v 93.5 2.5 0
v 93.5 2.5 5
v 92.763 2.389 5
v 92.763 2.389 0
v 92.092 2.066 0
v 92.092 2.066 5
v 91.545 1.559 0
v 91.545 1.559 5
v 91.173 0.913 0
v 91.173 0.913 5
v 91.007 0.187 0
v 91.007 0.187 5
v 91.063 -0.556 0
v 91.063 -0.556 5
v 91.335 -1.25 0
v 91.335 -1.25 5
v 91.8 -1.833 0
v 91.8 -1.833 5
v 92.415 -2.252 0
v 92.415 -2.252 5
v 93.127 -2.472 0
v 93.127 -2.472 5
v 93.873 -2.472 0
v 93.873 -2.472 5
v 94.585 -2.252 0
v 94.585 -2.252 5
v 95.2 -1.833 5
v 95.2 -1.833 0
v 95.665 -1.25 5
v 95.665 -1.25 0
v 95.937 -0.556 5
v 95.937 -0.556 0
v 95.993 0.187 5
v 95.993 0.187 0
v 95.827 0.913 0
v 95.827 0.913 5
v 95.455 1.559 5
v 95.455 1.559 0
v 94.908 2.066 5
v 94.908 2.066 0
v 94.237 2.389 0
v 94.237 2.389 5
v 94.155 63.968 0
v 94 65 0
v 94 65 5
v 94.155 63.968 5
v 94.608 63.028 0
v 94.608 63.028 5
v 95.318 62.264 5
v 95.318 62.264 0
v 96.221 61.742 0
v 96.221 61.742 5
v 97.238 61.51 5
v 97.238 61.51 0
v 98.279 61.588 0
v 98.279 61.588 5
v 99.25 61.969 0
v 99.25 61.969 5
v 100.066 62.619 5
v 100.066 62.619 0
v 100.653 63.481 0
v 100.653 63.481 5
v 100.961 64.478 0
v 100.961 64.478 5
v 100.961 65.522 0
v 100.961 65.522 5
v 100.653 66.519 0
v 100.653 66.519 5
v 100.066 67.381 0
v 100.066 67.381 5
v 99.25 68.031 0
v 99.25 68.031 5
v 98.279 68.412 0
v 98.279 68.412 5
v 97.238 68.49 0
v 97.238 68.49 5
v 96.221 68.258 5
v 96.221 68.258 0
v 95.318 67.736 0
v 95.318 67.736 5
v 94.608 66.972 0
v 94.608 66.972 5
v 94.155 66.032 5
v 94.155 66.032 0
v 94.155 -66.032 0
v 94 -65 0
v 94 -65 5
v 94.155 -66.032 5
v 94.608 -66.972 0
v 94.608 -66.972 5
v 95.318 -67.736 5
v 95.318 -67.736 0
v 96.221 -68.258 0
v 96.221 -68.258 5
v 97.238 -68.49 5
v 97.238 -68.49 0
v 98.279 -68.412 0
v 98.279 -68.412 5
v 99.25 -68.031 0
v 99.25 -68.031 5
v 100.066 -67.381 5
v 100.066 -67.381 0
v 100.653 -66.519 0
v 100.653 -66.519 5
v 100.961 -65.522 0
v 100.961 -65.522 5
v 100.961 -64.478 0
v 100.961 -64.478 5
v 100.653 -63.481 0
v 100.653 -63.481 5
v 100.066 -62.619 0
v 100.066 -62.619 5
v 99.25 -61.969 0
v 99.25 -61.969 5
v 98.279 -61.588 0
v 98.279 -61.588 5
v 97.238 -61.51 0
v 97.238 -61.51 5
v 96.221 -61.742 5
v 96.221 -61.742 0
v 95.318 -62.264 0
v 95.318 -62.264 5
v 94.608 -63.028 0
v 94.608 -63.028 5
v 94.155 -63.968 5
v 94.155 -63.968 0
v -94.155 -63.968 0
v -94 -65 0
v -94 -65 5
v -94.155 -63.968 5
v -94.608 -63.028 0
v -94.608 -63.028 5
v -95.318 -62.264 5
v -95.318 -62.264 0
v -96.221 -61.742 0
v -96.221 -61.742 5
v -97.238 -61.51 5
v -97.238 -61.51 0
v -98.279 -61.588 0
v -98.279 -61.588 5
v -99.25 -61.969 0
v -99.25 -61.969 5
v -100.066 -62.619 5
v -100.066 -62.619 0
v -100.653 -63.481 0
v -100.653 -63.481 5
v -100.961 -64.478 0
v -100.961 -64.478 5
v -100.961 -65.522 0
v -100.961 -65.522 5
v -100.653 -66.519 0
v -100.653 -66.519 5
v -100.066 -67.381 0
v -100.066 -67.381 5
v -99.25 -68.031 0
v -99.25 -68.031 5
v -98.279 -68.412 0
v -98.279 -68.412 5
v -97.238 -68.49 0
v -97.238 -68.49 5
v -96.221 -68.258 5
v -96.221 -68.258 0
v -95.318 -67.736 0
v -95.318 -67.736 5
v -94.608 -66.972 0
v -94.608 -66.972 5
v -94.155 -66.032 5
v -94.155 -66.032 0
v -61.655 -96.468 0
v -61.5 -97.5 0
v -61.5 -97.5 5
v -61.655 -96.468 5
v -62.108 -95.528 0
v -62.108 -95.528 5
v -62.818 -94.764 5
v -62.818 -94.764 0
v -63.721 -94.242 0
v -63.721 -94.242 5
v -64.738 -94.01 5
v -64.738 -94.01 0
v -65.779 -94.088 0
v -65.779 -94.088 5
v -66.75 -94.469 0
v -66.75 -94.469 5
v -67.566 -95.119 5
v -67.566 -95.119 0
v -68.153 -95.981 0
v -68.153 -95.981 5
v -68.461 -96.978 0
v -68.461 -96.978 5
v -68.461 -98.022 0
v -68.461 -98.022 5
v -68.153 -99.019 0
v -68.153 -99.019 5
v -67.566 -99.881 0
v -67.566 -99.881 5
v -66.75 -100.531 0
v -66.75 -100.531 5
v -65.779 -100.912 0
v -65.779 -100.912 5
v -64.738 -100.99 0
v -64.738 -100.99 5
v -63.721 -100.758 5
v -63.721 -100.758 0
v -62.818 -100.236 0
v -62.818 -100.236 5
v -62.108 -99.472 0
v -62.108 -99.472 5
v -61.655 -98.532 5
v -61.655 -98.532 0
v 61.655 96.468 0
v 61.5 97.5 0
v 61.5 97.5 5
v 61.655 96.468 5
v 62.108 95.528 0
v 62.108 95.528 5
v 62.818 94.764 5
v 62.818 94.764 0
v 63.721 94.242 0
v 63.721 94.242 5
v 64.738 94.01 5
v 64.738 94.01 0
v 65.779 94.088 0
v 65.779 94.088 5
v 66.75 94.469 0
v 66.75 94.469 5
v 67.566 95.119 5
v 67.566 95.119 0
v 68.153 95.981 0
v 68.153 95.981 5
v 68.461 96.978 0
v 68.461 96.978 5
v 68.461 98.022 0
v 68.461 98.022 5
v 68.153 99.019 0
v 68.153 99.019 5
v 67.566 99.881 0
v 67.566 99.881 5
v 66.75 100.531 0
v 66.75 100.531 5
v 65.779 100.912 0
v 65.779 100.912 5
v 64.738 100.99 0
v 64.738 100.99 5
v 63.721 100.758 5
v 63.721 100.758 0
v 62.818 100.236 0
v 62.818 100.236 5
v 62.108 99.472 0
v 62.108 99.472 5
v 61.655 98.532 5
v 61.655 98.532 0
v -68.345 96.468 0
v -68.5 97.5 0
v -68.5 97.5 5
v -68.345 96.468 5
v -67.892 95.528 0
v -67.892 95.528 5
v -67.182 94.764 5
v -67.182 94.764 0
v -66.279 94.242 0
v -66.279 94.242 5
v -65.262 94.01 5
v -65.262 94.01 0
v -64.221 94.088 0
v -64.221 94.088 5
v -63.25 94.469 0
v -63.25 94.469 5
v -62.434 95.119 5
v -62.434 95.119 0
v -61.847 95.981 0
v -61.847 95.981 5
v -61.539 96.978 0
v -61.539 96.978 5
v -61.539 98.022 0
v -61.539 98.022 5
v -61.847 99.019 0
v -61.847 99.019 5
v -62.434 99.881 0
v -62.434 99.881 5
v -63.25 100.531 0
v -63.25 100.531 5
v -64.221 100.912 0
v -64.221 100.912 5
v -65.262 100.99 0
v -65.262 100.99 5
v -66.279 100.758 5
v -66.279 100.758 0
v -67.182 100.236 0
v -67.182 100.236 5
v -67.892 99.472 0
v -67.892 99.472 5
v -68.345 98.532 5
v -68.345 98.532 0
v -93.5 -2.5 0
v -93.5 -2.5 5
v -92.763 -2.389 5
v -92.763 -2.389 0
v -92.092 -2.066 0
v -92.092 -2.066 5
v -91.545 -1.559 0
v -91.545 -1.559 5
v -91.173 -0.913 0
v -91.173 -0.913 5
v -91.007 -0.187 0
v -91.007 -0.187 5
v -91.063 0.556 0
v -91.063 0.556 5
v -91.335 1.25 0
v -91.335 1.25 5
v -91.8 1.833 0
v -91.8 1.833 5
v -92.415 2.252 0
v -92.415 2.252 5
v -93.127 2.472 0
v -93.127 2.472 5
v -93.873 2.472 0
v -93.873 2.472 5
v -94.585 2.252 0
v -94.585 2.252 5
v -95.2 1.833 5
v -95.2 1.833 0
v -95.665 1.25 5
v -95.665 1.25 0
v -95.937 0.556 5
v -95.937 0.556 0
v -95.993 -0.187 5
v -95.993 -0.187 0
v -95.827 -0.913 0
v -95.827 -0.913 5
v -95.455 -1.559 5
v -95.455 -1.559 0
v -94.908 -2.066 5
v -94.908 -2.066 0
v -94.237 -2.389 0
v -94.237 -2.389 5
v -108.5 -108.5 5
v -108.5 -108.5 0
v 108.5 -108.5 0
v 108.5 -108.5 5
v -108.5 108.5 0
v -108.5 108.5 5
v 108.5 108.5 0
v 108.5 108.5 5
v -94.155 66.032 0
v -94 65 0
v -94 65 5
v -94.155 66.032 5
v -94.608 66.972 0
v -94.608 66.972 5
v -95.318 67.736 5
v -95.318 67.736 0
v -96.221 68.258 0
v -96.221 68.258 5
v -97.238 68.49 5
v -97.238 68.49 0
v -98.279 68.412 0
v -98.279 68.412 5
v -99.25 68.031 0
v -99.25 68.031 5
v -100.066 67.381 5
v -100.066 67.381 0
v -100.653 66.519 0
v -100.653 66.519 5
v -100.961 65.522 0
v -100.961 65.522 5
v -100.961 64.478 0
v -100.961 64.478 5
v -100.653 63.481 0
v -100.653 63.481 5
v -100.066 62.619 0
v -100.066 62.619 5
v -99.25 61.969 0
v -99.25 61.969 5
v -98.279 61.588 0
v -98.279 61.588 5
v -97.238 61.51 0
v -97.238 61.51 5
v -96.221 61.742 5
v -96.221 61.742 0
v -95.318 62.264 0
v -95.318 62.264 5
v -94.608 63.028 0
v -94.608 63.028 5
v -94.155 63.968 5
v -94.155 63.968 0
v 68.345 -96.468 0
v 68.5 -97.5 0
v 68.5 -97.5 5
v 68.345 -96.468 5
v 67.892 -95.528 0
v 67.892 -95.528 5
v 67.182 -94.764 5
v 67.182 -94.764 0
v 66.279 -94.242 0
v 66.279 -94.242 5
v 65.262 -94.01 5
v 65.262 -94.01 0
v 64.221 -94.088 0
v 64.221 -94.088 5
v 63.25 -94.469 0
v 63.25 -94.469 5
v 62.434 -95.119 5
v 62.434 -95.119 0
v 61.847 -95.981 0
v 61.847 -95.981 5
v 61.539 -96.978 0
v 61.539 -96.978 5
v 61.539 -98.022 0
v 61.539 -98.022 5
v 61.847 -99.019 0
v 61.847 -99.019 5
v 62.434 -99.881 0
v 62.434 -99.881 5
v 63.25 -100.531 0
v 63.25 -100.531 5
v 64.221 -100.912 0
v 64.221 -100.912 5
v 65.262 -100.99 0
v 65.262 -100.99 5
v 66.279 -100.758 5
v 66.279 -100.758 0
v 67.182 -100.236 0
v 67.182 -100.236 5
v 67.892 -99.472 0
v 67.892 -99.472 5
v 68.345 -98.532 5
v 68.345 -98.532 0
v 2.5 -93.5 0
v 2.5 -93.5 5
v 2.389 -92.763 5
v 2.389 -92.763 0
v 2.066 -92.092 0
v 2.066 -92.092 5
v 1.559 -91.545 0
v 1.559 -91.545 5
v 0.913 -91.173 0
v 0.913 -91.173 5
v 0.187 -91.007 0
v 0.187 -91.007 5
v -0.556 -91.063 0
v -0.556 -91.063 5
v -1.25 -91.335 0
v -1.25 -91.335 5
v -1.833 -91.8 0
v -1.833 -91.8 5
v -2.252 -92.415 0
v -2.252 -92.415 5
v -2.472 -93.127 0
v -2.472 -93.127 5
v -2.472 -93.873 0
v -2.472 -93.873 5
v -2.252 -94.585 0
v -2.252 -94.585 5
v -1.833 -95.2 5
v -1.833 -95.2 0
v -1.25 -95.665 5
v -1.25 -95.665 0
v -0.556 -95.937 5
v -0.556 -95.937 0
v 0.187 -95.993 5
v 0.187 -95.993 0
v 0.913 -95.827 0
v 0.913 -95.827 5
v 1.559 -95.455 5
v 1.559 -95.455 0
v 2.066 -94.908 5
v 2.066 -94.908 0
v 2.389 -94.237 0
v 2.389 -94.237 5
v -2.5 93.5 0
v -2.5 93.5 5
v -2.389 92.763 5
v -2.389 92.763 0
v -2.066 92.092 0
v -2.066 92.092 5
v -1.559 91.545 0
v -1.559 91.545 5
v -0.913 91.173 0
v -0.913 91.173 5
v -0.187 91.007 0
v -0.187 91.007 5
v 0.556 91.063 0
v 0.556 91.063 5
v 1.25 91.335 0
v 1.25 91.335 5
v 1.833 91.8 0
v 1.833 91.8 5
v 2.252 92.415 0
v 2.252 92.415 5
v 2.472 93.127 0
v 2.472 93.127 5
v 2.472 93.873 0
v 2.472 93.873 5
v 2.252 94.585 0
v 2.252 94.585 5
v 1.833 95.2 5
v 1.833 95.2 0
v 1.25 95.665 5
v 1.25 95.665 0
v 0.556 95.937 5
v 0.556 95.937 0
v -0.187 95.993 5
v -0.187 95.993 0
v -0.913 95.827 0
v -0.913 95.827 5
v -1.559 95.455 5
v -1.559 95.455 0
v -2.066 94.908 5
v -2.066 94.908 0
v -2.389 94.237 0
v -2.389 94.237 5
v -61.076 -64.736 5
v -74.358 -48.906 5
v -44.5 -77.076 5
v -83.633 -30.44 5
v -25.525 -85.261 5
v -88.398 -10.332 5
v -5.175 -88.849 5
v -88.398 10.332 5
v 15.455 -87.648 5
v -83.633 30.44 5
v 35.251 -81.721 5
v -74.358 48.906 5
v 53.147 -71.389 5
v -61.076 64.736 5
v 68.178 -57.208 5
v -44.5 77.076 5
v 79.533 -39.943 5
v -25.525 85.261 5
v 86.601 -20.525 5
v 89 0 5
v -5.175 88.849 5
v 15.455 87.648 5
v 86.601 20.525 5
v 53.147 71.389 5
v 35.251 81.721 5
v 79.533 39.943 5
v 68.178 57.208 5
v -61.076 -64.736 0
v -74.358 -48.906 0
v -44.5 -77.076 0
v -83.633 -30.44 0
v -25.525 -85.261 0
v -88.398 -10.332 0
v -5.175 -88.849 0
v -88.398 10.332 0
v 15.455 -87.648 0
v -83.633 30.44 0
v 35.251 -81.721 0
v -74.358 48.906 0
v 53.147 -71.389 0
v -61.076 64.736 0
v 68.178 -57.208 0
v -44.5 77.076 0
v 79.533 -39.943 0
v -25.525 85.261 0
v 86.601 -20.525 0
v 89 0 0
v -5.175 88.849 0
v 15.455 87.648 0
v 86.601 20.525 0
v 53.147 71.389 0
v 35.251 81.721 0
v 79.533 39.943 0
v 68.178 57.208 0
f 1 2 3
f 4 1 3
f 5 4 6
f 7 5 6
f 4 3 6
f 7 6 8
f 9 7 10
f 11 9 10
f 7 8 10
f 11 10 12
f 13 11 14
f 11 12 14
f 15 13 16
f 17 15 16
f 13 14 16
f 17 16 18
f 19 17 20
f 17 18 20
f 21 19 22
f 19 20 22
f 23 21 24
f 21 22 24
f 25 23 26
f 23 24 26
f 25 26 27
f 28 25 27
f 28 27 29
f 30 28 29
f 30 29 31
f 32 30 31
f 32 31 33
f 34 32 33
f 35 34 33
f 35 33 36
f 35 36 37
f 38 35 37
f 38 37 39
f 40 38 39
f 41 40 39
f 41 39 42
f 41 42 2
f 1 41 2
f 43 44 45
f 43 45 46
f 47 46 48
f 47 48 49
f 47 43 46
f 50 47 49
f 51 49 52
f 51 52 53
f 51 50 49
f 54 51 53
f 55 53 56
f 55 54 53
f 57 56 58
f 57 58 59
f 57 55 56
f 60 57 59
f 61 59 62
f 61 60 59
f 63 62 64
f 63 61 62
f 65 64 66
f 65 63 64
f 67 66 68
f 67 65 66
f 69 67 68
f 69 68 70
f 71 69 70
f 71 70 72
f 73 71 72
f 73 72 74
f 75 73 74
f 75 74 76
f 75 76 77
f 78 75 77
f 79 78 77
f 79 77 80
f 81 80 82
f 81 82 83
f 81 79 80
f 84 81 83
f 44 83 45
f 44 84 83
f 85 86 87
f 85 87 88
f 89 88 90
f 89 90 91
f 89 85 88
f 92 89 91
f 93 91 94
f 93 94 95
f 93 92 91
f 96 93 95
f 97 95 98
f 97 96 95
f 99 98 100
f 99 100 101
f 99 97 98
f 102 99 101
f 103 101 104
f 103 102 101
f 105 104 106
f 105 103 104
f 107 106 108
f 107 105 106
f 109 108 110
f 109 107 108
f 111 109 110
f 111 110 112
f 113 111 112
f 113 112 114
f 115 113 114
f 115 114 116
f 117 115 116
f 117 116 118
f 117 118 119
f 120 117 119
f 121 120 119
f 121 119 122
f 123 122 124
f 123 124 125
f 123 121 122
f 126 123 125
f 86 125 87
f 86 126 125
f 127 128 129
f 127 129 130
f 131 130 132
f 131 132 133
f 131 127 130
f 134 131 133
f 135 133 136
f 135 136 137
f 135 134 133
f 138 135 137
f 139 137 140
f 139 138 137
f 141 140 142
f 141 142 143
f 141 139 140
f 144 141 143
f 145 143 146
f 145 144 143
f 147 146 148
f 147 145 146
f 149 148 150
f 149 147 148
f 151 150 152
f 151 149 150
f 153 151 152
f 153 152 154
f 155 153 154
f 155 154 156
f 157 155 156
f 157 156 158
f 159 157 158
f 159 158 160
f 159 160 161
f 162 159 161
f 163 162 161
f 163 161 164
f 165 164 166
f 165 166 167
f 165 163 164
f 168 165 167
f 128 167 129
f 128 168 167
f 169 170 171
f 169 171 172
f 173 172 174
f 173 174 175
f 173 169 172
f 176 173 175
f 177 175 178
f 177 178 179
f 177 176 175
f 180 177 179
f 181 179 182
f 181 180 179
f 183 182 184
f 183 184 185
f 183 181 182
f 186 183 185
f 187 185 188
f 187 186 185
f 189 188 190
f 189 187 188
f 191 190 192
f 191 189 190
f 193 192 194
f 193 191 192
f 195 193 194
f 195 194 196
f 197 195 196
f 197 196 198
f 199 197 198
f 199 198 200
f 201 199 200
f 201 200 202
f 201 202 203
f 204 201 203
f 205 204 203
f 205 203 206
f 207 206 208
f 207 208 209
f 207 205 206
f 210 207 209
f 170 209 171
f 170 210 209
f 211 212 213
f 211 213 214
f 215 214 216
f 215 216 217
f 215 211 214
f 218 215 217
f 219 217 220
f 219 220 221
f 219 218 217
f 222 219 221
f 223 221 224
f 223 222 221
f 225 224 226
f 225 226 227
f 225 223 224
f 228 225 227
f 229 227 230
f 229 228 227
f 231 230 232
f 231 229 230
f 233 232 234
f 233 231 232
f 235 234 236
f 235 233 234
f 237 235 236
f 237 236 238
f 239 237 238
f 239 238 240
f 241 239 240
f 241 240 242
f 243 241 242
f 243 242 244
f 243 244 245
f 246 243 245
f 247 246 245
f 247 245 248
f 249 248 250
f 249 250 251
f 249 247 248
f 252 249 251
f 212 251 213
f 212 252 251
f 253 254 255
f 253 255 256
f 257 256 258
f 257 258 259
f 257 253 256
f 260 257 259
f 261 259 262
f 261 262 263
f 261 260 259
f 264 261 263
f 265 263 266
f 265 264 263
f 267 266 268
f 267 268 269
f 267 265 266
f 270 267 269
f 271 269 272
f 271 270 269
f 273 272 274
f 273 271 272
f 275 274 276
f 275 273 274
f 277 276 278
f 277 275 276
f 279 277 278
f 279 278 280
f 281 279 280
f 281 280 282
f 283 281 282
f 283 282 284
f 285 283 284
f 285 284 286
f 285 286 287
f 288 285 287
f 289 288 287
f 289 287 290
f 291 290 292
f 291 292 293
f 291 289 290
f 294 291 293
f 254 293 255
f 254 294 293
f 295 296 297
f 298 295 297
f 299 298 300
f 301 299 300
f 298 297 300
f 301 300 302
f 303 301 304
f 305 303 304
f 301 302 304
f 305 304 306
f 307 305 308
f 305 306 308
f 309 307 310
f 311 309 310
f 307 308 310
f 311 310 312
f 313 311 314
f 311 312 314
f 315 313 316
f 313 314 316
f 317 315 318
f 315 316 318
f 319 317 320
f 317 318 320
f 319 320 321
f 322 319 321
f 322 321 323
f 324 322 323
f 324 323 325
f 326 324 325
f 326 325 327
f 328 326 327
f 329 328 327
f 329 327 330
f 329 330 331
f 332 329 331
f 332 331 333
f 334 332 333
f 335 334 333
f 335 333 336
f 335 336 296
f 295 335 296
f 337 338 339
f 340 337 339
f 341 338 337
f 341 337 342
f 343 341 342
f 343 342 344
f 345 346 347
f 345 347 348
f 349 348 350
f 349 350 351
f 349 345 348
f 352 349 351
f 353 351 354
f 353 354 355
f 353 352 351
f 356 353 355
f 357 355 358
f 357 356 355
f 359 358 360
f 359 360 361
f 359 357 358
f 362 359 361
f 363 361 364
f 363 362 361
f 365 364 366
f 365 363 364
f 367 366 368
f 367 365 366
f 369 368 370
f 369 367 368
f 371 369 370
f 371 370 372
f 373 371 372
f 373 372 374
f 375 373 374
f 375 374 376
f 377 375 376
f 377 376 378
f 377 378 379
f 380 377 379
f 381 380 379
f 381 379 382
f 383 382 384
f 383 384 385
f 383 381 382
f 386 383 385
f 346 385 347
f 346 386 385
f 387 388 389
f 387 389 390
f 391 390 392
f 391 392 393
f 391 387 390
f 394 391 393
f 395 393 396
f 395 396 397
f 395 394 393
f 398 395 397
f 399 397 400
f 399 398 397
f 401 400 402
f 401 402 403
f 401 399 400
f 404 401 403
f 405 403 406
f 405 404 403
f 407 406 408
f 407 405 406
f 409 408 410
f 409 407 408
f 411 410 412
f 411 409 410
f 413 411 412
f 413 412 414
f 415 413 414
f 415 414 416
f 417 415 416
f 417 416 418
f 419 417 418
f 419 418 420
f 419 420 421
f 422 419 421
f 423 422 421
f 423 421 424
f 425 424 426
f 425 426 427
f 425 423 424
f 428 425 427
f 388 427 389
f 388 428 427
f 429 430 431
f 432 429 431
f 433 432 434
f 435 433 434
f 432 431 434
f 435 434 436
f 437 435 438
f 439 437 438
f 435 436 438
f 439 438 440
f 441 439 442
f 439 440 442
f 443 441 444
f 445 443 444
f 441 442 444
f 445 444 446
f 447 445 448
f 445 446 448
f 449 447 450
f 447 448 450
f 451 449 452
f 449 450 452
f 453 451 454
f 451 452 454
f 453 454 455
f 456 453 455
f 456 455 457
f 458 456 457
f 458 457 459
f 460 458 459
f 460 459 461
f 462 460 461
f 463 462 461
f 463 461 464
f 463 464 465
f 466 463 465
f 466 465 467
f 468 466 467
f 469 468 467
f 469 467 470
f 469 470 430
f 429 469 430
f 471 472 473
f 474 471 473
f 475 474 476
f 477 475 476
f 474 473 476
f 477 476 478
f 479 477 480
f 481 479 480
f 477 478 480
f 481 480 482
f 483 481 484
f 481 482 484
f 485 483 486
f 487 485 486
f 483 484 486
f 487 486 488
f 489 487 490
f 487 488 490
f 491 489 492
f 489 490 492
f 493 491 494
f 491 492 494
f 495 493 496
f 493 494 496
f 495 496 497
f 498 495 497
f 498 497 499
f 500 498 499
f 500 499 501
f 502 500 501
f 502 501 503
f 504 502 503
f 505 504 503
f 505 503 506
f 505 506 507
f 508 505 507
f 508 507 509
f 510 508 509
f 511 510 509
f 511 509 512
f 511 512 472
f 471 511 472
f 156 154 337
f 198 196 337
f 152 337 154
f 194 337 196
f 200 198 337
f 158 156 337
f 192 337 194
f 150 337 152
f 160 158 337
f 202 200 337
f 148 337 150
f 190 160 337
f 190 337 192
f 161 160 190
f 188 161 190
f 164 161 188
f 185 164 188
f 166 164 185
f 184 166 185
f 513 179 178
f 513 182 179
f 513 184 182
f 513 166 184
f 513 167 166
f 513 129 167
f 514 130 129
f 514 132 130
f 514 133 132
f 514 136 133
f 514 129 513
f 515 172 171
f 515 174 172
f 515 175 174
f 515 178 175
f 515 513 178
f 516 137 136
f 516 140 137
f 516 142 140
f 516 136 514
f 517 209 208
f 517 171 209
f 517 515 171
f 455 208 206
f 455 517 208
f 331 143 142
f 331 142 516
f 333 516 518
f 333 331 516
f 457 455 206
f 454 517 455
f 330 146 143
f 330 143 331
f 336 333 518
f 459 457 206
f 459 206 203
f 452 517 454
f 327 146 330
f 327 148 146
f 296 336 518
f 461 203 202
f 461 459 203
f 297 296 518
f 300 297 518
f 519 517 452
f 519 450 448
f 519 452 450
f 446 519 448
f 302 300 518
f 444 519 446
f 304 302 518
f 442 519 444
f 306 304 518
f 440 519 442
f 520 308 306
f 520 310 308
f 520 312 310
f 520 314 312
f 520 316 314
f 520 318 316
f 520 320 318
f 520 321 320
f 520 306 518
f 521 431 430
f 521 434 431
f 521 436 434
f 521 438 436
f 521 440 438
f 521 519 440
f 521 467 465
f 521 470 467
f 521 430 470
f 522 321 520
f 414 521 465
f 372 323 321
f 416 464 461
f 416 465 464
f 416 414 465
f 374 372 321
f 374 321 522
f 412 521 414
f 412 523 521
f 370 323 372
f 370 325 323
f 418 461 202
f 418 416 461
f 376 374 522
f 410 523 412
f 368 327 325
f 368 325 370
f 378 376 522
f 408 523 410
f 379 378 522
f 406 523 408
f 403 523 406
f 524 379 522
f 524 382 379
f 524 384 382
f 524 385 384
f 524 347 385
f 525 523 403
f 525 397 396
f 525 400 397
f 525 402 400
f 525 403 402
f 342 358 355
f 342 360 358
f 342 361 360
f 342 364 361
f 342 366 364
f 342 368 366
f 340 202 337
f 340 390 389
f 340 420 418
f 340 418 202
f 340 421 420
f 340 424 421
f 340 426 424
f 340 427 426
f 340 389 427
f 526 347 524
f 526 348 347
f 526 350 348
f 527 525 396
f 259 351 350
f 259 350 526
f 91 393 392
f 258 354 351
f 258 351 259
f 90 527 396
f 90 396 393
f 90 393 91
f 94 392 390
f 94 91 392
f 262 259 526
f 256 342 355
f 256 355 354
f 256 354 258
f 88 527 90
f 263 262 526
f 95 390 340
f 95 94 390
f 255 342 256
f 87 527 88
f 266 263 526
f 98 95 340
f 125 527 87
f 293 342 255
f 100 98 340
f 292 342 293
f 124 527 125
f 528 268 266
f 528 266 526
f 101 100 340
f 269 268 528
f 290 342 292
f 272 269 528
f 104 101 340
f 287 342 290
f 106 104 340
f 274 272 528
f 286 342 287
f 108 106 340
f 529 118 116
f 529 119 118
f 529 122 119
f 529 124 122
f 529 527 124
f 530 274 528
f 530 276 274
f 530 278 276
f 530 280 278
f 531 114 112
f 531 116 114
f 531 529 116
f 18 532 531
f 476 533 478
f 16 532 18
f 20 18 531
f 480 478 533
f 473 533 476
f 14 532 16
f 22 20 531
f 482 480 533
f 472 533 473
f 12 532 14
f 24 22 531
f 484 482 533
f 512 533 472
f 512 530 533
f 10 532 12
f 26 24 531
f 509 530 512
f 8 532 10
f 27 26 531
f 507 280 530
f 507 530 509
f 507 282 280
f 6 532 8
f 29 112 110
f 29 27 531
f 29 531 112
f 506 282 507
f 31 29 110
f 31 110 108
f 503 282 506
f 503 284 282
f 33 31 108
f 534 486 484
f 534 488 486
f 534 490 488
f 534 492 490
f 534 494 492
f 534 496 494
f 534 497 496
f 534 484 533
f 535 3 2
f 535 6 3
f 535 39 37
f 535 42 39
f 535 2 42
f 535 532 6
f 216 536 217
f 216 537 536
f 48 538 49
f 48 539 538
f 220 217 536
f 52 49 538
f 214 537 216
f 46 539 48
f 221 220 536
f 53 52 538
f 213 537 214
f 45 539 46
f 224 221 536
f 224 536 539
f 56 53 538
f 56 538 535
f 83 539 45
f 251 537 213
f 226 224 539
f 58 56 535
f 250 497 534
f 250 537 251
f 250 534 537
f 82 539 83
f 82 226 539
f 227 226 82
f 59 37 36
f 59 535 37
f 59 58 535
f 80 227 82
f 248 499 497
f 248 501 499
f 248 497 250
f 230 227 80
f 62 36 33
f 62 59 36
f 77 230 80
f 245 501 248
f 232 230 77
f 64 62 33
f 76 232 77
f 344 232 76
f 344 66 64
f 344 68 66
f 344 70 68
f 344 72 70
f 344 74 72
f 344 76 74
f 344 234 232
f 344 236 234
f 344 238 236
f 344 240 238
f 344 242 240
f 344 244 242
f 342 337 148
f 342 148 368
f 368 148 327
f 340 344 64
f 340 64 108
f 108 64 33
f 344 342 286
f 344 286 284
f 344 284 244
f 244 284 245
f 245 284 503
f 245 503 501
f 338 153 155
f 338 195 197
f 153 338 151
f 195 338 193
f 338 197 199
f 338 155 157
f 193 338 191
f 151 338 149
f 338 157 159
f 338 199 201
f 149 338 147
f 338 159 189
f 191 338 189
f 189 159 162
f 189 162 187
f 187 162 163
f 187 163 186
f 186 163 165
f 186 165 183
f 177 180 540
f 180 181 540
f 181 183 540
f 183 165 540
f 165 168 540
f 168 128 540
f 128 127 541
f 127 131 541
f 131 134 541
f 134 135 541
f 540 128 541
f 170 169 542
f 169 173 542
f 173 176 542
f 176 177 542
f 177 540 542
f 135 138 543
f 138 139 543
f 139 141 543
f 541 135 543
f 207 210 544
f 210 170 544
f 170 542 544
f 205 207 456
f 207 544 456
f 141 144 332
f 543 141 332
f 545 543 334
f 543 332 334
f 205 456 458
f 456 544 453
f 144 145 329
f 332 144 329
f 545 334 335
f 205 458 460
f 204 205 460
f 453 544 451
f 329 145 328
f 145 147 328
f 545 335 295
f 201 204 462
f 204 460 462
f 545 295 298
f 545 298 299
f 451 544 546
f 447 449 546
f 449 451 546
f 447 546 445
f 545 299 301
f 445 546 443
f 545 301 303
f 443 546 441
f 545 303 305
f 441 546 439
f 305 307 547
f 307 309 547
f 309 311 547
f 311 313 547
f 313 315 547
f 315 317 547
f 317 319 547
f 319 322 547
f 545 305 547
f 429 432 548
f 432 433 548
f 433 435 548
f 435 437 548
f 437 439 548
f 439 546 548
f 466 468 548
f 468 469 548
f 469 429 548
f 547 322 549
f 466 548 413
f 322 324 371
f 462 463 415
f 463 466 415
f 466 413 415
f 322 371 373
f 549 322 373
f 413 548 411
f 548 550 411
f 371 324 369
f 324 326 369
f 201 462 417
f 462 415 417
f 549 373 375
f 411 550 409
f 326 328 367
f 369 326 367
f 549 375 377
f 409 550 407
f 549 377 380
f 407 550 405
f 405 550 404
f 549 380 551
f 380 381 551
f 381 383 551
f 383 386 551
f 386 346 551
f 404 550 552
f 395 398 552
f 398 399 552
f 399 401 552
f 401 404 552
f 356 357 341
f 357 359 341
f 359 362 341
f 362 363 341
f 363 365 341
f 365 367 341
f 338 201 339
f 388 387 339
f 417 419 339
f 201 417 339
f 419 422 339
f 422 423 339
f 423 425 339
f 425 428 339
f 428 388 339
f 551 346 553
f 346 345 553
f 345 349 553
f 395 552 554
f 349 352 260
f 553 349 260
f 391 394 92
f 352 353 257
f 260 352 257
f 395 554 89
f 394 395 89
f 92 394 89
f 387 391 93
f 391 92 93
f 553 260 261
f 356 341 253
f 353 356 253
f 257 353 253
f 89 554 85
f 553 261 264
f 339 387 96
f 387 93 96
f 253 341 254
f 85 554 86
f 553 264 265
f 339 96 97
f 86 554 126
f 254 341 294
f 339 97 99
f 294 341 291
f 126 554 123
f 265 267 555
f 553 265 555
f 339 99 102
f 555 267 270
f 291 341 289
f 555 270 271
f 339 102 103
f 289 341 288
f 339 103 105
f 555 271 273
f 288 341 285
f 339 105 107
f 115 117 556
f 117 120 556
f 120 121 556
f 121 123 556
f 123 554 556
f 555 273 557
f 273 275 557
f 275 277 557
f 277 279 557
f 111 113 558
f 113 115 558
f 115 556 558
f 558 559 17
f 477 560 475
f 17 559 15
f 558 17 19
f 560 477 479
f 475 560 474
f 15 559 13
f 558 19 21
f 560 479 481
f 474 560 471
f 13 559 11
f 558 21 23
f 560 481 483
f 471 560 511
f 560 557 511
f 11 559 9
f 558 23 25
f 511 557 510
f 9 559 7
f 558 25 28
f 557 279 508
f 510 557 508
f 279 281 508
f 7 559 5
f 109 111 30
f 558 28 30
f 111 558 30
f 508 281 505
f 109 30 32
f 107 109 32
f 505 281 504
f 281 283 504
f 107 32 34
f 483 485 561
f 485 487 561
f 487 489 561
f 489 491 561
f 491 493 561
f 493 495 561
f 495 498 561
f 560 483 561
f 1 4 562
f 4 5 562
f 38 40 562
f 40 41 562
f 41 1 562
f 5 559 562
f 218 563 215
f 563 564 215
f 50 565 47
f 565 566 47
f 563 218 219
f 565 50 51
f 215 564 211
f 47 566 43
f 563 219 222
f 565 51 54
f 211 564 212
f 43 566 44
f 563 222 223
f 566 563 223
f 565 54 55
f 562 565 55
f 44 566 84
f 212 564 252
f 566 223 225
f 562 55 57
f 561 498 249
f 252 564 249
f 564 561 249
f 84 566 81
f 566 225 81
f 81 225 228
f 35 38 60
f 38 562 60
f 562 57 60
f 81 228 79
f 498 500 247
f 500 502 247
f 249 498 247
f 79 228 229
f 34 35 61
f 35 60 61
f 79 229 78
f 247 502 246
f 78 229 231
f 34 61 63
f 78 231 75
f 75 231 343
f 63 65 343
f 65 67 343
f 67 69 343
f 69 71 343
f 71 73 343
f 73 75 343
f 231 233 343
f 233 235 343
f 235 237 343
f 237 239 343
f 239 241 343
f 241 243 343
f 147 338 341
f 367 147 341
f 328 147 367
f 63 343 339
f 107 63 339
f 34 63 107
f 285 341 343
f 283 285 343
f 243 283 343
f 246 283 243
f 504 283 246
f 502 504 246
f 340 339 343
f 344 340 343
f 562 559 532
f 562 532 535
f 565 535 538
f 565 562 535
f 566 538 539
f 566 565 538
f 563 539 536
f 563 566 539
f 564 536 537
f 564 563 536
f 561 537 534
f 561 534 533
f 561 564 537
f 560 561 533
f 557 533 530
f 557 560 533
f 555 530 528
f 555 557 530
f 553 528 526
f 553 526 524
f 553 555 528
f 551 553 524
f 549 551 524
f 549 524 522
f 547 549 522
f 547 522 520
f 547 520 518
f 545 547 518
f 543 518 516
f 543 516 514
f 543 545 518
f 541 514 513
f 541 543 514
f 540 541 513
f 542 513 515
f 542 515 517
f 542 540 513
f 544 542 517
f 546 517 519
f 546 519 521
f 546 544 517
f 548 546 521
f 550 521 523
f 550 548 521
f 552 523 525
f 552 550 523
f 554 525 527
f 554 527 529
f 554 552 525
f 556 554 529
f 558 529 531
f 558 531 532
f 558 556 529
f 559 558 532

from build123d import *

# Parameters (mm, degrees)
SKETCH2_W           = 217
SKETCH2_H           = 217
SKETCH2_R           = 89
SKETCH2_R_2         = 3.5
BOSS_EXTRUDE1_DEPTH = 5
M6_TAPPED_HOLE1_D   = 5
CIRPATTERN1_COUNT   = 4


with BuildPart() as part:
    # Sketch2 → Boss-Extrude1 (new body)
    with BuildSketch(Plane.XY):
        Rectangle(SKETCH2_W, SKETCH2_H)
        Circle(SKETCH2_R, mode=Mode.SUBTRACT)
        with Locations((-97.5, -65)):
            Circle(SKETCH2_R_2, mode=Mode.SUBTRACT)
        with Locations((-97.5, 65)):
            Circle(SKETCH2_R_2, mode=Mode.SUBTRACT)
        with Locations(Location((97.5, 65, 0), (0, 0, 180))):
            Circle(SKETCH2_R_2, mode=Mode.SUBTRACT)
        with Locations(Location((97.5, -65, 0), (0, 0, 180))):
            Circle(SKETCH2_R_2, mode=Mode.SUBTRACT)
        with Locations((-65, -97.5)):
            Circle(SKETCH2_R_2, mode=Mode.SUBTRACT)
        with Locations((65, -97.5)):
            Circle(SKETCH2_R_2, mode=Mode.SUBTRACT)
        with Locations(Location((65, 97.5, 0), (0, 0, 180))):
            Circle(SKETCH2_R_2, mode=Mode.SUBTRACT)
        with Locations(Location((-65, 97.5, 0), (0, 0, 180))):
            Circle(SKETCH2_R_2, mode=Mode.SUBTRACT)
    extrude(amount=BOSS_EXTRUDE1_DEPTH)

    # M6 Tapped Hole1 (through all)
    with Locations(Plane(origin=(0, 0, 0), x_dir=(-1, 0, 0), z_dir=(0, 0, -1))):
        with Locations((0, -93.5)):
            m6_tapped_hole1 = Hole(M6_TAPPED_HOLE1_D / 2)

    # CirPattern1: M6 Tapped Hole1 ×4 about axis
    cirpattern1_axis = Axis((0, 0, 0), (0, 0, 1))
    for i in range(1, CIRPATTERN1_COUNT):
        add(m6_tapped_hole1.rotate(cirpattern1_axis, i * 360 / CIRPATTERN1_COUNT), mode=Mode.SUBTRACT)


solid = part.part
